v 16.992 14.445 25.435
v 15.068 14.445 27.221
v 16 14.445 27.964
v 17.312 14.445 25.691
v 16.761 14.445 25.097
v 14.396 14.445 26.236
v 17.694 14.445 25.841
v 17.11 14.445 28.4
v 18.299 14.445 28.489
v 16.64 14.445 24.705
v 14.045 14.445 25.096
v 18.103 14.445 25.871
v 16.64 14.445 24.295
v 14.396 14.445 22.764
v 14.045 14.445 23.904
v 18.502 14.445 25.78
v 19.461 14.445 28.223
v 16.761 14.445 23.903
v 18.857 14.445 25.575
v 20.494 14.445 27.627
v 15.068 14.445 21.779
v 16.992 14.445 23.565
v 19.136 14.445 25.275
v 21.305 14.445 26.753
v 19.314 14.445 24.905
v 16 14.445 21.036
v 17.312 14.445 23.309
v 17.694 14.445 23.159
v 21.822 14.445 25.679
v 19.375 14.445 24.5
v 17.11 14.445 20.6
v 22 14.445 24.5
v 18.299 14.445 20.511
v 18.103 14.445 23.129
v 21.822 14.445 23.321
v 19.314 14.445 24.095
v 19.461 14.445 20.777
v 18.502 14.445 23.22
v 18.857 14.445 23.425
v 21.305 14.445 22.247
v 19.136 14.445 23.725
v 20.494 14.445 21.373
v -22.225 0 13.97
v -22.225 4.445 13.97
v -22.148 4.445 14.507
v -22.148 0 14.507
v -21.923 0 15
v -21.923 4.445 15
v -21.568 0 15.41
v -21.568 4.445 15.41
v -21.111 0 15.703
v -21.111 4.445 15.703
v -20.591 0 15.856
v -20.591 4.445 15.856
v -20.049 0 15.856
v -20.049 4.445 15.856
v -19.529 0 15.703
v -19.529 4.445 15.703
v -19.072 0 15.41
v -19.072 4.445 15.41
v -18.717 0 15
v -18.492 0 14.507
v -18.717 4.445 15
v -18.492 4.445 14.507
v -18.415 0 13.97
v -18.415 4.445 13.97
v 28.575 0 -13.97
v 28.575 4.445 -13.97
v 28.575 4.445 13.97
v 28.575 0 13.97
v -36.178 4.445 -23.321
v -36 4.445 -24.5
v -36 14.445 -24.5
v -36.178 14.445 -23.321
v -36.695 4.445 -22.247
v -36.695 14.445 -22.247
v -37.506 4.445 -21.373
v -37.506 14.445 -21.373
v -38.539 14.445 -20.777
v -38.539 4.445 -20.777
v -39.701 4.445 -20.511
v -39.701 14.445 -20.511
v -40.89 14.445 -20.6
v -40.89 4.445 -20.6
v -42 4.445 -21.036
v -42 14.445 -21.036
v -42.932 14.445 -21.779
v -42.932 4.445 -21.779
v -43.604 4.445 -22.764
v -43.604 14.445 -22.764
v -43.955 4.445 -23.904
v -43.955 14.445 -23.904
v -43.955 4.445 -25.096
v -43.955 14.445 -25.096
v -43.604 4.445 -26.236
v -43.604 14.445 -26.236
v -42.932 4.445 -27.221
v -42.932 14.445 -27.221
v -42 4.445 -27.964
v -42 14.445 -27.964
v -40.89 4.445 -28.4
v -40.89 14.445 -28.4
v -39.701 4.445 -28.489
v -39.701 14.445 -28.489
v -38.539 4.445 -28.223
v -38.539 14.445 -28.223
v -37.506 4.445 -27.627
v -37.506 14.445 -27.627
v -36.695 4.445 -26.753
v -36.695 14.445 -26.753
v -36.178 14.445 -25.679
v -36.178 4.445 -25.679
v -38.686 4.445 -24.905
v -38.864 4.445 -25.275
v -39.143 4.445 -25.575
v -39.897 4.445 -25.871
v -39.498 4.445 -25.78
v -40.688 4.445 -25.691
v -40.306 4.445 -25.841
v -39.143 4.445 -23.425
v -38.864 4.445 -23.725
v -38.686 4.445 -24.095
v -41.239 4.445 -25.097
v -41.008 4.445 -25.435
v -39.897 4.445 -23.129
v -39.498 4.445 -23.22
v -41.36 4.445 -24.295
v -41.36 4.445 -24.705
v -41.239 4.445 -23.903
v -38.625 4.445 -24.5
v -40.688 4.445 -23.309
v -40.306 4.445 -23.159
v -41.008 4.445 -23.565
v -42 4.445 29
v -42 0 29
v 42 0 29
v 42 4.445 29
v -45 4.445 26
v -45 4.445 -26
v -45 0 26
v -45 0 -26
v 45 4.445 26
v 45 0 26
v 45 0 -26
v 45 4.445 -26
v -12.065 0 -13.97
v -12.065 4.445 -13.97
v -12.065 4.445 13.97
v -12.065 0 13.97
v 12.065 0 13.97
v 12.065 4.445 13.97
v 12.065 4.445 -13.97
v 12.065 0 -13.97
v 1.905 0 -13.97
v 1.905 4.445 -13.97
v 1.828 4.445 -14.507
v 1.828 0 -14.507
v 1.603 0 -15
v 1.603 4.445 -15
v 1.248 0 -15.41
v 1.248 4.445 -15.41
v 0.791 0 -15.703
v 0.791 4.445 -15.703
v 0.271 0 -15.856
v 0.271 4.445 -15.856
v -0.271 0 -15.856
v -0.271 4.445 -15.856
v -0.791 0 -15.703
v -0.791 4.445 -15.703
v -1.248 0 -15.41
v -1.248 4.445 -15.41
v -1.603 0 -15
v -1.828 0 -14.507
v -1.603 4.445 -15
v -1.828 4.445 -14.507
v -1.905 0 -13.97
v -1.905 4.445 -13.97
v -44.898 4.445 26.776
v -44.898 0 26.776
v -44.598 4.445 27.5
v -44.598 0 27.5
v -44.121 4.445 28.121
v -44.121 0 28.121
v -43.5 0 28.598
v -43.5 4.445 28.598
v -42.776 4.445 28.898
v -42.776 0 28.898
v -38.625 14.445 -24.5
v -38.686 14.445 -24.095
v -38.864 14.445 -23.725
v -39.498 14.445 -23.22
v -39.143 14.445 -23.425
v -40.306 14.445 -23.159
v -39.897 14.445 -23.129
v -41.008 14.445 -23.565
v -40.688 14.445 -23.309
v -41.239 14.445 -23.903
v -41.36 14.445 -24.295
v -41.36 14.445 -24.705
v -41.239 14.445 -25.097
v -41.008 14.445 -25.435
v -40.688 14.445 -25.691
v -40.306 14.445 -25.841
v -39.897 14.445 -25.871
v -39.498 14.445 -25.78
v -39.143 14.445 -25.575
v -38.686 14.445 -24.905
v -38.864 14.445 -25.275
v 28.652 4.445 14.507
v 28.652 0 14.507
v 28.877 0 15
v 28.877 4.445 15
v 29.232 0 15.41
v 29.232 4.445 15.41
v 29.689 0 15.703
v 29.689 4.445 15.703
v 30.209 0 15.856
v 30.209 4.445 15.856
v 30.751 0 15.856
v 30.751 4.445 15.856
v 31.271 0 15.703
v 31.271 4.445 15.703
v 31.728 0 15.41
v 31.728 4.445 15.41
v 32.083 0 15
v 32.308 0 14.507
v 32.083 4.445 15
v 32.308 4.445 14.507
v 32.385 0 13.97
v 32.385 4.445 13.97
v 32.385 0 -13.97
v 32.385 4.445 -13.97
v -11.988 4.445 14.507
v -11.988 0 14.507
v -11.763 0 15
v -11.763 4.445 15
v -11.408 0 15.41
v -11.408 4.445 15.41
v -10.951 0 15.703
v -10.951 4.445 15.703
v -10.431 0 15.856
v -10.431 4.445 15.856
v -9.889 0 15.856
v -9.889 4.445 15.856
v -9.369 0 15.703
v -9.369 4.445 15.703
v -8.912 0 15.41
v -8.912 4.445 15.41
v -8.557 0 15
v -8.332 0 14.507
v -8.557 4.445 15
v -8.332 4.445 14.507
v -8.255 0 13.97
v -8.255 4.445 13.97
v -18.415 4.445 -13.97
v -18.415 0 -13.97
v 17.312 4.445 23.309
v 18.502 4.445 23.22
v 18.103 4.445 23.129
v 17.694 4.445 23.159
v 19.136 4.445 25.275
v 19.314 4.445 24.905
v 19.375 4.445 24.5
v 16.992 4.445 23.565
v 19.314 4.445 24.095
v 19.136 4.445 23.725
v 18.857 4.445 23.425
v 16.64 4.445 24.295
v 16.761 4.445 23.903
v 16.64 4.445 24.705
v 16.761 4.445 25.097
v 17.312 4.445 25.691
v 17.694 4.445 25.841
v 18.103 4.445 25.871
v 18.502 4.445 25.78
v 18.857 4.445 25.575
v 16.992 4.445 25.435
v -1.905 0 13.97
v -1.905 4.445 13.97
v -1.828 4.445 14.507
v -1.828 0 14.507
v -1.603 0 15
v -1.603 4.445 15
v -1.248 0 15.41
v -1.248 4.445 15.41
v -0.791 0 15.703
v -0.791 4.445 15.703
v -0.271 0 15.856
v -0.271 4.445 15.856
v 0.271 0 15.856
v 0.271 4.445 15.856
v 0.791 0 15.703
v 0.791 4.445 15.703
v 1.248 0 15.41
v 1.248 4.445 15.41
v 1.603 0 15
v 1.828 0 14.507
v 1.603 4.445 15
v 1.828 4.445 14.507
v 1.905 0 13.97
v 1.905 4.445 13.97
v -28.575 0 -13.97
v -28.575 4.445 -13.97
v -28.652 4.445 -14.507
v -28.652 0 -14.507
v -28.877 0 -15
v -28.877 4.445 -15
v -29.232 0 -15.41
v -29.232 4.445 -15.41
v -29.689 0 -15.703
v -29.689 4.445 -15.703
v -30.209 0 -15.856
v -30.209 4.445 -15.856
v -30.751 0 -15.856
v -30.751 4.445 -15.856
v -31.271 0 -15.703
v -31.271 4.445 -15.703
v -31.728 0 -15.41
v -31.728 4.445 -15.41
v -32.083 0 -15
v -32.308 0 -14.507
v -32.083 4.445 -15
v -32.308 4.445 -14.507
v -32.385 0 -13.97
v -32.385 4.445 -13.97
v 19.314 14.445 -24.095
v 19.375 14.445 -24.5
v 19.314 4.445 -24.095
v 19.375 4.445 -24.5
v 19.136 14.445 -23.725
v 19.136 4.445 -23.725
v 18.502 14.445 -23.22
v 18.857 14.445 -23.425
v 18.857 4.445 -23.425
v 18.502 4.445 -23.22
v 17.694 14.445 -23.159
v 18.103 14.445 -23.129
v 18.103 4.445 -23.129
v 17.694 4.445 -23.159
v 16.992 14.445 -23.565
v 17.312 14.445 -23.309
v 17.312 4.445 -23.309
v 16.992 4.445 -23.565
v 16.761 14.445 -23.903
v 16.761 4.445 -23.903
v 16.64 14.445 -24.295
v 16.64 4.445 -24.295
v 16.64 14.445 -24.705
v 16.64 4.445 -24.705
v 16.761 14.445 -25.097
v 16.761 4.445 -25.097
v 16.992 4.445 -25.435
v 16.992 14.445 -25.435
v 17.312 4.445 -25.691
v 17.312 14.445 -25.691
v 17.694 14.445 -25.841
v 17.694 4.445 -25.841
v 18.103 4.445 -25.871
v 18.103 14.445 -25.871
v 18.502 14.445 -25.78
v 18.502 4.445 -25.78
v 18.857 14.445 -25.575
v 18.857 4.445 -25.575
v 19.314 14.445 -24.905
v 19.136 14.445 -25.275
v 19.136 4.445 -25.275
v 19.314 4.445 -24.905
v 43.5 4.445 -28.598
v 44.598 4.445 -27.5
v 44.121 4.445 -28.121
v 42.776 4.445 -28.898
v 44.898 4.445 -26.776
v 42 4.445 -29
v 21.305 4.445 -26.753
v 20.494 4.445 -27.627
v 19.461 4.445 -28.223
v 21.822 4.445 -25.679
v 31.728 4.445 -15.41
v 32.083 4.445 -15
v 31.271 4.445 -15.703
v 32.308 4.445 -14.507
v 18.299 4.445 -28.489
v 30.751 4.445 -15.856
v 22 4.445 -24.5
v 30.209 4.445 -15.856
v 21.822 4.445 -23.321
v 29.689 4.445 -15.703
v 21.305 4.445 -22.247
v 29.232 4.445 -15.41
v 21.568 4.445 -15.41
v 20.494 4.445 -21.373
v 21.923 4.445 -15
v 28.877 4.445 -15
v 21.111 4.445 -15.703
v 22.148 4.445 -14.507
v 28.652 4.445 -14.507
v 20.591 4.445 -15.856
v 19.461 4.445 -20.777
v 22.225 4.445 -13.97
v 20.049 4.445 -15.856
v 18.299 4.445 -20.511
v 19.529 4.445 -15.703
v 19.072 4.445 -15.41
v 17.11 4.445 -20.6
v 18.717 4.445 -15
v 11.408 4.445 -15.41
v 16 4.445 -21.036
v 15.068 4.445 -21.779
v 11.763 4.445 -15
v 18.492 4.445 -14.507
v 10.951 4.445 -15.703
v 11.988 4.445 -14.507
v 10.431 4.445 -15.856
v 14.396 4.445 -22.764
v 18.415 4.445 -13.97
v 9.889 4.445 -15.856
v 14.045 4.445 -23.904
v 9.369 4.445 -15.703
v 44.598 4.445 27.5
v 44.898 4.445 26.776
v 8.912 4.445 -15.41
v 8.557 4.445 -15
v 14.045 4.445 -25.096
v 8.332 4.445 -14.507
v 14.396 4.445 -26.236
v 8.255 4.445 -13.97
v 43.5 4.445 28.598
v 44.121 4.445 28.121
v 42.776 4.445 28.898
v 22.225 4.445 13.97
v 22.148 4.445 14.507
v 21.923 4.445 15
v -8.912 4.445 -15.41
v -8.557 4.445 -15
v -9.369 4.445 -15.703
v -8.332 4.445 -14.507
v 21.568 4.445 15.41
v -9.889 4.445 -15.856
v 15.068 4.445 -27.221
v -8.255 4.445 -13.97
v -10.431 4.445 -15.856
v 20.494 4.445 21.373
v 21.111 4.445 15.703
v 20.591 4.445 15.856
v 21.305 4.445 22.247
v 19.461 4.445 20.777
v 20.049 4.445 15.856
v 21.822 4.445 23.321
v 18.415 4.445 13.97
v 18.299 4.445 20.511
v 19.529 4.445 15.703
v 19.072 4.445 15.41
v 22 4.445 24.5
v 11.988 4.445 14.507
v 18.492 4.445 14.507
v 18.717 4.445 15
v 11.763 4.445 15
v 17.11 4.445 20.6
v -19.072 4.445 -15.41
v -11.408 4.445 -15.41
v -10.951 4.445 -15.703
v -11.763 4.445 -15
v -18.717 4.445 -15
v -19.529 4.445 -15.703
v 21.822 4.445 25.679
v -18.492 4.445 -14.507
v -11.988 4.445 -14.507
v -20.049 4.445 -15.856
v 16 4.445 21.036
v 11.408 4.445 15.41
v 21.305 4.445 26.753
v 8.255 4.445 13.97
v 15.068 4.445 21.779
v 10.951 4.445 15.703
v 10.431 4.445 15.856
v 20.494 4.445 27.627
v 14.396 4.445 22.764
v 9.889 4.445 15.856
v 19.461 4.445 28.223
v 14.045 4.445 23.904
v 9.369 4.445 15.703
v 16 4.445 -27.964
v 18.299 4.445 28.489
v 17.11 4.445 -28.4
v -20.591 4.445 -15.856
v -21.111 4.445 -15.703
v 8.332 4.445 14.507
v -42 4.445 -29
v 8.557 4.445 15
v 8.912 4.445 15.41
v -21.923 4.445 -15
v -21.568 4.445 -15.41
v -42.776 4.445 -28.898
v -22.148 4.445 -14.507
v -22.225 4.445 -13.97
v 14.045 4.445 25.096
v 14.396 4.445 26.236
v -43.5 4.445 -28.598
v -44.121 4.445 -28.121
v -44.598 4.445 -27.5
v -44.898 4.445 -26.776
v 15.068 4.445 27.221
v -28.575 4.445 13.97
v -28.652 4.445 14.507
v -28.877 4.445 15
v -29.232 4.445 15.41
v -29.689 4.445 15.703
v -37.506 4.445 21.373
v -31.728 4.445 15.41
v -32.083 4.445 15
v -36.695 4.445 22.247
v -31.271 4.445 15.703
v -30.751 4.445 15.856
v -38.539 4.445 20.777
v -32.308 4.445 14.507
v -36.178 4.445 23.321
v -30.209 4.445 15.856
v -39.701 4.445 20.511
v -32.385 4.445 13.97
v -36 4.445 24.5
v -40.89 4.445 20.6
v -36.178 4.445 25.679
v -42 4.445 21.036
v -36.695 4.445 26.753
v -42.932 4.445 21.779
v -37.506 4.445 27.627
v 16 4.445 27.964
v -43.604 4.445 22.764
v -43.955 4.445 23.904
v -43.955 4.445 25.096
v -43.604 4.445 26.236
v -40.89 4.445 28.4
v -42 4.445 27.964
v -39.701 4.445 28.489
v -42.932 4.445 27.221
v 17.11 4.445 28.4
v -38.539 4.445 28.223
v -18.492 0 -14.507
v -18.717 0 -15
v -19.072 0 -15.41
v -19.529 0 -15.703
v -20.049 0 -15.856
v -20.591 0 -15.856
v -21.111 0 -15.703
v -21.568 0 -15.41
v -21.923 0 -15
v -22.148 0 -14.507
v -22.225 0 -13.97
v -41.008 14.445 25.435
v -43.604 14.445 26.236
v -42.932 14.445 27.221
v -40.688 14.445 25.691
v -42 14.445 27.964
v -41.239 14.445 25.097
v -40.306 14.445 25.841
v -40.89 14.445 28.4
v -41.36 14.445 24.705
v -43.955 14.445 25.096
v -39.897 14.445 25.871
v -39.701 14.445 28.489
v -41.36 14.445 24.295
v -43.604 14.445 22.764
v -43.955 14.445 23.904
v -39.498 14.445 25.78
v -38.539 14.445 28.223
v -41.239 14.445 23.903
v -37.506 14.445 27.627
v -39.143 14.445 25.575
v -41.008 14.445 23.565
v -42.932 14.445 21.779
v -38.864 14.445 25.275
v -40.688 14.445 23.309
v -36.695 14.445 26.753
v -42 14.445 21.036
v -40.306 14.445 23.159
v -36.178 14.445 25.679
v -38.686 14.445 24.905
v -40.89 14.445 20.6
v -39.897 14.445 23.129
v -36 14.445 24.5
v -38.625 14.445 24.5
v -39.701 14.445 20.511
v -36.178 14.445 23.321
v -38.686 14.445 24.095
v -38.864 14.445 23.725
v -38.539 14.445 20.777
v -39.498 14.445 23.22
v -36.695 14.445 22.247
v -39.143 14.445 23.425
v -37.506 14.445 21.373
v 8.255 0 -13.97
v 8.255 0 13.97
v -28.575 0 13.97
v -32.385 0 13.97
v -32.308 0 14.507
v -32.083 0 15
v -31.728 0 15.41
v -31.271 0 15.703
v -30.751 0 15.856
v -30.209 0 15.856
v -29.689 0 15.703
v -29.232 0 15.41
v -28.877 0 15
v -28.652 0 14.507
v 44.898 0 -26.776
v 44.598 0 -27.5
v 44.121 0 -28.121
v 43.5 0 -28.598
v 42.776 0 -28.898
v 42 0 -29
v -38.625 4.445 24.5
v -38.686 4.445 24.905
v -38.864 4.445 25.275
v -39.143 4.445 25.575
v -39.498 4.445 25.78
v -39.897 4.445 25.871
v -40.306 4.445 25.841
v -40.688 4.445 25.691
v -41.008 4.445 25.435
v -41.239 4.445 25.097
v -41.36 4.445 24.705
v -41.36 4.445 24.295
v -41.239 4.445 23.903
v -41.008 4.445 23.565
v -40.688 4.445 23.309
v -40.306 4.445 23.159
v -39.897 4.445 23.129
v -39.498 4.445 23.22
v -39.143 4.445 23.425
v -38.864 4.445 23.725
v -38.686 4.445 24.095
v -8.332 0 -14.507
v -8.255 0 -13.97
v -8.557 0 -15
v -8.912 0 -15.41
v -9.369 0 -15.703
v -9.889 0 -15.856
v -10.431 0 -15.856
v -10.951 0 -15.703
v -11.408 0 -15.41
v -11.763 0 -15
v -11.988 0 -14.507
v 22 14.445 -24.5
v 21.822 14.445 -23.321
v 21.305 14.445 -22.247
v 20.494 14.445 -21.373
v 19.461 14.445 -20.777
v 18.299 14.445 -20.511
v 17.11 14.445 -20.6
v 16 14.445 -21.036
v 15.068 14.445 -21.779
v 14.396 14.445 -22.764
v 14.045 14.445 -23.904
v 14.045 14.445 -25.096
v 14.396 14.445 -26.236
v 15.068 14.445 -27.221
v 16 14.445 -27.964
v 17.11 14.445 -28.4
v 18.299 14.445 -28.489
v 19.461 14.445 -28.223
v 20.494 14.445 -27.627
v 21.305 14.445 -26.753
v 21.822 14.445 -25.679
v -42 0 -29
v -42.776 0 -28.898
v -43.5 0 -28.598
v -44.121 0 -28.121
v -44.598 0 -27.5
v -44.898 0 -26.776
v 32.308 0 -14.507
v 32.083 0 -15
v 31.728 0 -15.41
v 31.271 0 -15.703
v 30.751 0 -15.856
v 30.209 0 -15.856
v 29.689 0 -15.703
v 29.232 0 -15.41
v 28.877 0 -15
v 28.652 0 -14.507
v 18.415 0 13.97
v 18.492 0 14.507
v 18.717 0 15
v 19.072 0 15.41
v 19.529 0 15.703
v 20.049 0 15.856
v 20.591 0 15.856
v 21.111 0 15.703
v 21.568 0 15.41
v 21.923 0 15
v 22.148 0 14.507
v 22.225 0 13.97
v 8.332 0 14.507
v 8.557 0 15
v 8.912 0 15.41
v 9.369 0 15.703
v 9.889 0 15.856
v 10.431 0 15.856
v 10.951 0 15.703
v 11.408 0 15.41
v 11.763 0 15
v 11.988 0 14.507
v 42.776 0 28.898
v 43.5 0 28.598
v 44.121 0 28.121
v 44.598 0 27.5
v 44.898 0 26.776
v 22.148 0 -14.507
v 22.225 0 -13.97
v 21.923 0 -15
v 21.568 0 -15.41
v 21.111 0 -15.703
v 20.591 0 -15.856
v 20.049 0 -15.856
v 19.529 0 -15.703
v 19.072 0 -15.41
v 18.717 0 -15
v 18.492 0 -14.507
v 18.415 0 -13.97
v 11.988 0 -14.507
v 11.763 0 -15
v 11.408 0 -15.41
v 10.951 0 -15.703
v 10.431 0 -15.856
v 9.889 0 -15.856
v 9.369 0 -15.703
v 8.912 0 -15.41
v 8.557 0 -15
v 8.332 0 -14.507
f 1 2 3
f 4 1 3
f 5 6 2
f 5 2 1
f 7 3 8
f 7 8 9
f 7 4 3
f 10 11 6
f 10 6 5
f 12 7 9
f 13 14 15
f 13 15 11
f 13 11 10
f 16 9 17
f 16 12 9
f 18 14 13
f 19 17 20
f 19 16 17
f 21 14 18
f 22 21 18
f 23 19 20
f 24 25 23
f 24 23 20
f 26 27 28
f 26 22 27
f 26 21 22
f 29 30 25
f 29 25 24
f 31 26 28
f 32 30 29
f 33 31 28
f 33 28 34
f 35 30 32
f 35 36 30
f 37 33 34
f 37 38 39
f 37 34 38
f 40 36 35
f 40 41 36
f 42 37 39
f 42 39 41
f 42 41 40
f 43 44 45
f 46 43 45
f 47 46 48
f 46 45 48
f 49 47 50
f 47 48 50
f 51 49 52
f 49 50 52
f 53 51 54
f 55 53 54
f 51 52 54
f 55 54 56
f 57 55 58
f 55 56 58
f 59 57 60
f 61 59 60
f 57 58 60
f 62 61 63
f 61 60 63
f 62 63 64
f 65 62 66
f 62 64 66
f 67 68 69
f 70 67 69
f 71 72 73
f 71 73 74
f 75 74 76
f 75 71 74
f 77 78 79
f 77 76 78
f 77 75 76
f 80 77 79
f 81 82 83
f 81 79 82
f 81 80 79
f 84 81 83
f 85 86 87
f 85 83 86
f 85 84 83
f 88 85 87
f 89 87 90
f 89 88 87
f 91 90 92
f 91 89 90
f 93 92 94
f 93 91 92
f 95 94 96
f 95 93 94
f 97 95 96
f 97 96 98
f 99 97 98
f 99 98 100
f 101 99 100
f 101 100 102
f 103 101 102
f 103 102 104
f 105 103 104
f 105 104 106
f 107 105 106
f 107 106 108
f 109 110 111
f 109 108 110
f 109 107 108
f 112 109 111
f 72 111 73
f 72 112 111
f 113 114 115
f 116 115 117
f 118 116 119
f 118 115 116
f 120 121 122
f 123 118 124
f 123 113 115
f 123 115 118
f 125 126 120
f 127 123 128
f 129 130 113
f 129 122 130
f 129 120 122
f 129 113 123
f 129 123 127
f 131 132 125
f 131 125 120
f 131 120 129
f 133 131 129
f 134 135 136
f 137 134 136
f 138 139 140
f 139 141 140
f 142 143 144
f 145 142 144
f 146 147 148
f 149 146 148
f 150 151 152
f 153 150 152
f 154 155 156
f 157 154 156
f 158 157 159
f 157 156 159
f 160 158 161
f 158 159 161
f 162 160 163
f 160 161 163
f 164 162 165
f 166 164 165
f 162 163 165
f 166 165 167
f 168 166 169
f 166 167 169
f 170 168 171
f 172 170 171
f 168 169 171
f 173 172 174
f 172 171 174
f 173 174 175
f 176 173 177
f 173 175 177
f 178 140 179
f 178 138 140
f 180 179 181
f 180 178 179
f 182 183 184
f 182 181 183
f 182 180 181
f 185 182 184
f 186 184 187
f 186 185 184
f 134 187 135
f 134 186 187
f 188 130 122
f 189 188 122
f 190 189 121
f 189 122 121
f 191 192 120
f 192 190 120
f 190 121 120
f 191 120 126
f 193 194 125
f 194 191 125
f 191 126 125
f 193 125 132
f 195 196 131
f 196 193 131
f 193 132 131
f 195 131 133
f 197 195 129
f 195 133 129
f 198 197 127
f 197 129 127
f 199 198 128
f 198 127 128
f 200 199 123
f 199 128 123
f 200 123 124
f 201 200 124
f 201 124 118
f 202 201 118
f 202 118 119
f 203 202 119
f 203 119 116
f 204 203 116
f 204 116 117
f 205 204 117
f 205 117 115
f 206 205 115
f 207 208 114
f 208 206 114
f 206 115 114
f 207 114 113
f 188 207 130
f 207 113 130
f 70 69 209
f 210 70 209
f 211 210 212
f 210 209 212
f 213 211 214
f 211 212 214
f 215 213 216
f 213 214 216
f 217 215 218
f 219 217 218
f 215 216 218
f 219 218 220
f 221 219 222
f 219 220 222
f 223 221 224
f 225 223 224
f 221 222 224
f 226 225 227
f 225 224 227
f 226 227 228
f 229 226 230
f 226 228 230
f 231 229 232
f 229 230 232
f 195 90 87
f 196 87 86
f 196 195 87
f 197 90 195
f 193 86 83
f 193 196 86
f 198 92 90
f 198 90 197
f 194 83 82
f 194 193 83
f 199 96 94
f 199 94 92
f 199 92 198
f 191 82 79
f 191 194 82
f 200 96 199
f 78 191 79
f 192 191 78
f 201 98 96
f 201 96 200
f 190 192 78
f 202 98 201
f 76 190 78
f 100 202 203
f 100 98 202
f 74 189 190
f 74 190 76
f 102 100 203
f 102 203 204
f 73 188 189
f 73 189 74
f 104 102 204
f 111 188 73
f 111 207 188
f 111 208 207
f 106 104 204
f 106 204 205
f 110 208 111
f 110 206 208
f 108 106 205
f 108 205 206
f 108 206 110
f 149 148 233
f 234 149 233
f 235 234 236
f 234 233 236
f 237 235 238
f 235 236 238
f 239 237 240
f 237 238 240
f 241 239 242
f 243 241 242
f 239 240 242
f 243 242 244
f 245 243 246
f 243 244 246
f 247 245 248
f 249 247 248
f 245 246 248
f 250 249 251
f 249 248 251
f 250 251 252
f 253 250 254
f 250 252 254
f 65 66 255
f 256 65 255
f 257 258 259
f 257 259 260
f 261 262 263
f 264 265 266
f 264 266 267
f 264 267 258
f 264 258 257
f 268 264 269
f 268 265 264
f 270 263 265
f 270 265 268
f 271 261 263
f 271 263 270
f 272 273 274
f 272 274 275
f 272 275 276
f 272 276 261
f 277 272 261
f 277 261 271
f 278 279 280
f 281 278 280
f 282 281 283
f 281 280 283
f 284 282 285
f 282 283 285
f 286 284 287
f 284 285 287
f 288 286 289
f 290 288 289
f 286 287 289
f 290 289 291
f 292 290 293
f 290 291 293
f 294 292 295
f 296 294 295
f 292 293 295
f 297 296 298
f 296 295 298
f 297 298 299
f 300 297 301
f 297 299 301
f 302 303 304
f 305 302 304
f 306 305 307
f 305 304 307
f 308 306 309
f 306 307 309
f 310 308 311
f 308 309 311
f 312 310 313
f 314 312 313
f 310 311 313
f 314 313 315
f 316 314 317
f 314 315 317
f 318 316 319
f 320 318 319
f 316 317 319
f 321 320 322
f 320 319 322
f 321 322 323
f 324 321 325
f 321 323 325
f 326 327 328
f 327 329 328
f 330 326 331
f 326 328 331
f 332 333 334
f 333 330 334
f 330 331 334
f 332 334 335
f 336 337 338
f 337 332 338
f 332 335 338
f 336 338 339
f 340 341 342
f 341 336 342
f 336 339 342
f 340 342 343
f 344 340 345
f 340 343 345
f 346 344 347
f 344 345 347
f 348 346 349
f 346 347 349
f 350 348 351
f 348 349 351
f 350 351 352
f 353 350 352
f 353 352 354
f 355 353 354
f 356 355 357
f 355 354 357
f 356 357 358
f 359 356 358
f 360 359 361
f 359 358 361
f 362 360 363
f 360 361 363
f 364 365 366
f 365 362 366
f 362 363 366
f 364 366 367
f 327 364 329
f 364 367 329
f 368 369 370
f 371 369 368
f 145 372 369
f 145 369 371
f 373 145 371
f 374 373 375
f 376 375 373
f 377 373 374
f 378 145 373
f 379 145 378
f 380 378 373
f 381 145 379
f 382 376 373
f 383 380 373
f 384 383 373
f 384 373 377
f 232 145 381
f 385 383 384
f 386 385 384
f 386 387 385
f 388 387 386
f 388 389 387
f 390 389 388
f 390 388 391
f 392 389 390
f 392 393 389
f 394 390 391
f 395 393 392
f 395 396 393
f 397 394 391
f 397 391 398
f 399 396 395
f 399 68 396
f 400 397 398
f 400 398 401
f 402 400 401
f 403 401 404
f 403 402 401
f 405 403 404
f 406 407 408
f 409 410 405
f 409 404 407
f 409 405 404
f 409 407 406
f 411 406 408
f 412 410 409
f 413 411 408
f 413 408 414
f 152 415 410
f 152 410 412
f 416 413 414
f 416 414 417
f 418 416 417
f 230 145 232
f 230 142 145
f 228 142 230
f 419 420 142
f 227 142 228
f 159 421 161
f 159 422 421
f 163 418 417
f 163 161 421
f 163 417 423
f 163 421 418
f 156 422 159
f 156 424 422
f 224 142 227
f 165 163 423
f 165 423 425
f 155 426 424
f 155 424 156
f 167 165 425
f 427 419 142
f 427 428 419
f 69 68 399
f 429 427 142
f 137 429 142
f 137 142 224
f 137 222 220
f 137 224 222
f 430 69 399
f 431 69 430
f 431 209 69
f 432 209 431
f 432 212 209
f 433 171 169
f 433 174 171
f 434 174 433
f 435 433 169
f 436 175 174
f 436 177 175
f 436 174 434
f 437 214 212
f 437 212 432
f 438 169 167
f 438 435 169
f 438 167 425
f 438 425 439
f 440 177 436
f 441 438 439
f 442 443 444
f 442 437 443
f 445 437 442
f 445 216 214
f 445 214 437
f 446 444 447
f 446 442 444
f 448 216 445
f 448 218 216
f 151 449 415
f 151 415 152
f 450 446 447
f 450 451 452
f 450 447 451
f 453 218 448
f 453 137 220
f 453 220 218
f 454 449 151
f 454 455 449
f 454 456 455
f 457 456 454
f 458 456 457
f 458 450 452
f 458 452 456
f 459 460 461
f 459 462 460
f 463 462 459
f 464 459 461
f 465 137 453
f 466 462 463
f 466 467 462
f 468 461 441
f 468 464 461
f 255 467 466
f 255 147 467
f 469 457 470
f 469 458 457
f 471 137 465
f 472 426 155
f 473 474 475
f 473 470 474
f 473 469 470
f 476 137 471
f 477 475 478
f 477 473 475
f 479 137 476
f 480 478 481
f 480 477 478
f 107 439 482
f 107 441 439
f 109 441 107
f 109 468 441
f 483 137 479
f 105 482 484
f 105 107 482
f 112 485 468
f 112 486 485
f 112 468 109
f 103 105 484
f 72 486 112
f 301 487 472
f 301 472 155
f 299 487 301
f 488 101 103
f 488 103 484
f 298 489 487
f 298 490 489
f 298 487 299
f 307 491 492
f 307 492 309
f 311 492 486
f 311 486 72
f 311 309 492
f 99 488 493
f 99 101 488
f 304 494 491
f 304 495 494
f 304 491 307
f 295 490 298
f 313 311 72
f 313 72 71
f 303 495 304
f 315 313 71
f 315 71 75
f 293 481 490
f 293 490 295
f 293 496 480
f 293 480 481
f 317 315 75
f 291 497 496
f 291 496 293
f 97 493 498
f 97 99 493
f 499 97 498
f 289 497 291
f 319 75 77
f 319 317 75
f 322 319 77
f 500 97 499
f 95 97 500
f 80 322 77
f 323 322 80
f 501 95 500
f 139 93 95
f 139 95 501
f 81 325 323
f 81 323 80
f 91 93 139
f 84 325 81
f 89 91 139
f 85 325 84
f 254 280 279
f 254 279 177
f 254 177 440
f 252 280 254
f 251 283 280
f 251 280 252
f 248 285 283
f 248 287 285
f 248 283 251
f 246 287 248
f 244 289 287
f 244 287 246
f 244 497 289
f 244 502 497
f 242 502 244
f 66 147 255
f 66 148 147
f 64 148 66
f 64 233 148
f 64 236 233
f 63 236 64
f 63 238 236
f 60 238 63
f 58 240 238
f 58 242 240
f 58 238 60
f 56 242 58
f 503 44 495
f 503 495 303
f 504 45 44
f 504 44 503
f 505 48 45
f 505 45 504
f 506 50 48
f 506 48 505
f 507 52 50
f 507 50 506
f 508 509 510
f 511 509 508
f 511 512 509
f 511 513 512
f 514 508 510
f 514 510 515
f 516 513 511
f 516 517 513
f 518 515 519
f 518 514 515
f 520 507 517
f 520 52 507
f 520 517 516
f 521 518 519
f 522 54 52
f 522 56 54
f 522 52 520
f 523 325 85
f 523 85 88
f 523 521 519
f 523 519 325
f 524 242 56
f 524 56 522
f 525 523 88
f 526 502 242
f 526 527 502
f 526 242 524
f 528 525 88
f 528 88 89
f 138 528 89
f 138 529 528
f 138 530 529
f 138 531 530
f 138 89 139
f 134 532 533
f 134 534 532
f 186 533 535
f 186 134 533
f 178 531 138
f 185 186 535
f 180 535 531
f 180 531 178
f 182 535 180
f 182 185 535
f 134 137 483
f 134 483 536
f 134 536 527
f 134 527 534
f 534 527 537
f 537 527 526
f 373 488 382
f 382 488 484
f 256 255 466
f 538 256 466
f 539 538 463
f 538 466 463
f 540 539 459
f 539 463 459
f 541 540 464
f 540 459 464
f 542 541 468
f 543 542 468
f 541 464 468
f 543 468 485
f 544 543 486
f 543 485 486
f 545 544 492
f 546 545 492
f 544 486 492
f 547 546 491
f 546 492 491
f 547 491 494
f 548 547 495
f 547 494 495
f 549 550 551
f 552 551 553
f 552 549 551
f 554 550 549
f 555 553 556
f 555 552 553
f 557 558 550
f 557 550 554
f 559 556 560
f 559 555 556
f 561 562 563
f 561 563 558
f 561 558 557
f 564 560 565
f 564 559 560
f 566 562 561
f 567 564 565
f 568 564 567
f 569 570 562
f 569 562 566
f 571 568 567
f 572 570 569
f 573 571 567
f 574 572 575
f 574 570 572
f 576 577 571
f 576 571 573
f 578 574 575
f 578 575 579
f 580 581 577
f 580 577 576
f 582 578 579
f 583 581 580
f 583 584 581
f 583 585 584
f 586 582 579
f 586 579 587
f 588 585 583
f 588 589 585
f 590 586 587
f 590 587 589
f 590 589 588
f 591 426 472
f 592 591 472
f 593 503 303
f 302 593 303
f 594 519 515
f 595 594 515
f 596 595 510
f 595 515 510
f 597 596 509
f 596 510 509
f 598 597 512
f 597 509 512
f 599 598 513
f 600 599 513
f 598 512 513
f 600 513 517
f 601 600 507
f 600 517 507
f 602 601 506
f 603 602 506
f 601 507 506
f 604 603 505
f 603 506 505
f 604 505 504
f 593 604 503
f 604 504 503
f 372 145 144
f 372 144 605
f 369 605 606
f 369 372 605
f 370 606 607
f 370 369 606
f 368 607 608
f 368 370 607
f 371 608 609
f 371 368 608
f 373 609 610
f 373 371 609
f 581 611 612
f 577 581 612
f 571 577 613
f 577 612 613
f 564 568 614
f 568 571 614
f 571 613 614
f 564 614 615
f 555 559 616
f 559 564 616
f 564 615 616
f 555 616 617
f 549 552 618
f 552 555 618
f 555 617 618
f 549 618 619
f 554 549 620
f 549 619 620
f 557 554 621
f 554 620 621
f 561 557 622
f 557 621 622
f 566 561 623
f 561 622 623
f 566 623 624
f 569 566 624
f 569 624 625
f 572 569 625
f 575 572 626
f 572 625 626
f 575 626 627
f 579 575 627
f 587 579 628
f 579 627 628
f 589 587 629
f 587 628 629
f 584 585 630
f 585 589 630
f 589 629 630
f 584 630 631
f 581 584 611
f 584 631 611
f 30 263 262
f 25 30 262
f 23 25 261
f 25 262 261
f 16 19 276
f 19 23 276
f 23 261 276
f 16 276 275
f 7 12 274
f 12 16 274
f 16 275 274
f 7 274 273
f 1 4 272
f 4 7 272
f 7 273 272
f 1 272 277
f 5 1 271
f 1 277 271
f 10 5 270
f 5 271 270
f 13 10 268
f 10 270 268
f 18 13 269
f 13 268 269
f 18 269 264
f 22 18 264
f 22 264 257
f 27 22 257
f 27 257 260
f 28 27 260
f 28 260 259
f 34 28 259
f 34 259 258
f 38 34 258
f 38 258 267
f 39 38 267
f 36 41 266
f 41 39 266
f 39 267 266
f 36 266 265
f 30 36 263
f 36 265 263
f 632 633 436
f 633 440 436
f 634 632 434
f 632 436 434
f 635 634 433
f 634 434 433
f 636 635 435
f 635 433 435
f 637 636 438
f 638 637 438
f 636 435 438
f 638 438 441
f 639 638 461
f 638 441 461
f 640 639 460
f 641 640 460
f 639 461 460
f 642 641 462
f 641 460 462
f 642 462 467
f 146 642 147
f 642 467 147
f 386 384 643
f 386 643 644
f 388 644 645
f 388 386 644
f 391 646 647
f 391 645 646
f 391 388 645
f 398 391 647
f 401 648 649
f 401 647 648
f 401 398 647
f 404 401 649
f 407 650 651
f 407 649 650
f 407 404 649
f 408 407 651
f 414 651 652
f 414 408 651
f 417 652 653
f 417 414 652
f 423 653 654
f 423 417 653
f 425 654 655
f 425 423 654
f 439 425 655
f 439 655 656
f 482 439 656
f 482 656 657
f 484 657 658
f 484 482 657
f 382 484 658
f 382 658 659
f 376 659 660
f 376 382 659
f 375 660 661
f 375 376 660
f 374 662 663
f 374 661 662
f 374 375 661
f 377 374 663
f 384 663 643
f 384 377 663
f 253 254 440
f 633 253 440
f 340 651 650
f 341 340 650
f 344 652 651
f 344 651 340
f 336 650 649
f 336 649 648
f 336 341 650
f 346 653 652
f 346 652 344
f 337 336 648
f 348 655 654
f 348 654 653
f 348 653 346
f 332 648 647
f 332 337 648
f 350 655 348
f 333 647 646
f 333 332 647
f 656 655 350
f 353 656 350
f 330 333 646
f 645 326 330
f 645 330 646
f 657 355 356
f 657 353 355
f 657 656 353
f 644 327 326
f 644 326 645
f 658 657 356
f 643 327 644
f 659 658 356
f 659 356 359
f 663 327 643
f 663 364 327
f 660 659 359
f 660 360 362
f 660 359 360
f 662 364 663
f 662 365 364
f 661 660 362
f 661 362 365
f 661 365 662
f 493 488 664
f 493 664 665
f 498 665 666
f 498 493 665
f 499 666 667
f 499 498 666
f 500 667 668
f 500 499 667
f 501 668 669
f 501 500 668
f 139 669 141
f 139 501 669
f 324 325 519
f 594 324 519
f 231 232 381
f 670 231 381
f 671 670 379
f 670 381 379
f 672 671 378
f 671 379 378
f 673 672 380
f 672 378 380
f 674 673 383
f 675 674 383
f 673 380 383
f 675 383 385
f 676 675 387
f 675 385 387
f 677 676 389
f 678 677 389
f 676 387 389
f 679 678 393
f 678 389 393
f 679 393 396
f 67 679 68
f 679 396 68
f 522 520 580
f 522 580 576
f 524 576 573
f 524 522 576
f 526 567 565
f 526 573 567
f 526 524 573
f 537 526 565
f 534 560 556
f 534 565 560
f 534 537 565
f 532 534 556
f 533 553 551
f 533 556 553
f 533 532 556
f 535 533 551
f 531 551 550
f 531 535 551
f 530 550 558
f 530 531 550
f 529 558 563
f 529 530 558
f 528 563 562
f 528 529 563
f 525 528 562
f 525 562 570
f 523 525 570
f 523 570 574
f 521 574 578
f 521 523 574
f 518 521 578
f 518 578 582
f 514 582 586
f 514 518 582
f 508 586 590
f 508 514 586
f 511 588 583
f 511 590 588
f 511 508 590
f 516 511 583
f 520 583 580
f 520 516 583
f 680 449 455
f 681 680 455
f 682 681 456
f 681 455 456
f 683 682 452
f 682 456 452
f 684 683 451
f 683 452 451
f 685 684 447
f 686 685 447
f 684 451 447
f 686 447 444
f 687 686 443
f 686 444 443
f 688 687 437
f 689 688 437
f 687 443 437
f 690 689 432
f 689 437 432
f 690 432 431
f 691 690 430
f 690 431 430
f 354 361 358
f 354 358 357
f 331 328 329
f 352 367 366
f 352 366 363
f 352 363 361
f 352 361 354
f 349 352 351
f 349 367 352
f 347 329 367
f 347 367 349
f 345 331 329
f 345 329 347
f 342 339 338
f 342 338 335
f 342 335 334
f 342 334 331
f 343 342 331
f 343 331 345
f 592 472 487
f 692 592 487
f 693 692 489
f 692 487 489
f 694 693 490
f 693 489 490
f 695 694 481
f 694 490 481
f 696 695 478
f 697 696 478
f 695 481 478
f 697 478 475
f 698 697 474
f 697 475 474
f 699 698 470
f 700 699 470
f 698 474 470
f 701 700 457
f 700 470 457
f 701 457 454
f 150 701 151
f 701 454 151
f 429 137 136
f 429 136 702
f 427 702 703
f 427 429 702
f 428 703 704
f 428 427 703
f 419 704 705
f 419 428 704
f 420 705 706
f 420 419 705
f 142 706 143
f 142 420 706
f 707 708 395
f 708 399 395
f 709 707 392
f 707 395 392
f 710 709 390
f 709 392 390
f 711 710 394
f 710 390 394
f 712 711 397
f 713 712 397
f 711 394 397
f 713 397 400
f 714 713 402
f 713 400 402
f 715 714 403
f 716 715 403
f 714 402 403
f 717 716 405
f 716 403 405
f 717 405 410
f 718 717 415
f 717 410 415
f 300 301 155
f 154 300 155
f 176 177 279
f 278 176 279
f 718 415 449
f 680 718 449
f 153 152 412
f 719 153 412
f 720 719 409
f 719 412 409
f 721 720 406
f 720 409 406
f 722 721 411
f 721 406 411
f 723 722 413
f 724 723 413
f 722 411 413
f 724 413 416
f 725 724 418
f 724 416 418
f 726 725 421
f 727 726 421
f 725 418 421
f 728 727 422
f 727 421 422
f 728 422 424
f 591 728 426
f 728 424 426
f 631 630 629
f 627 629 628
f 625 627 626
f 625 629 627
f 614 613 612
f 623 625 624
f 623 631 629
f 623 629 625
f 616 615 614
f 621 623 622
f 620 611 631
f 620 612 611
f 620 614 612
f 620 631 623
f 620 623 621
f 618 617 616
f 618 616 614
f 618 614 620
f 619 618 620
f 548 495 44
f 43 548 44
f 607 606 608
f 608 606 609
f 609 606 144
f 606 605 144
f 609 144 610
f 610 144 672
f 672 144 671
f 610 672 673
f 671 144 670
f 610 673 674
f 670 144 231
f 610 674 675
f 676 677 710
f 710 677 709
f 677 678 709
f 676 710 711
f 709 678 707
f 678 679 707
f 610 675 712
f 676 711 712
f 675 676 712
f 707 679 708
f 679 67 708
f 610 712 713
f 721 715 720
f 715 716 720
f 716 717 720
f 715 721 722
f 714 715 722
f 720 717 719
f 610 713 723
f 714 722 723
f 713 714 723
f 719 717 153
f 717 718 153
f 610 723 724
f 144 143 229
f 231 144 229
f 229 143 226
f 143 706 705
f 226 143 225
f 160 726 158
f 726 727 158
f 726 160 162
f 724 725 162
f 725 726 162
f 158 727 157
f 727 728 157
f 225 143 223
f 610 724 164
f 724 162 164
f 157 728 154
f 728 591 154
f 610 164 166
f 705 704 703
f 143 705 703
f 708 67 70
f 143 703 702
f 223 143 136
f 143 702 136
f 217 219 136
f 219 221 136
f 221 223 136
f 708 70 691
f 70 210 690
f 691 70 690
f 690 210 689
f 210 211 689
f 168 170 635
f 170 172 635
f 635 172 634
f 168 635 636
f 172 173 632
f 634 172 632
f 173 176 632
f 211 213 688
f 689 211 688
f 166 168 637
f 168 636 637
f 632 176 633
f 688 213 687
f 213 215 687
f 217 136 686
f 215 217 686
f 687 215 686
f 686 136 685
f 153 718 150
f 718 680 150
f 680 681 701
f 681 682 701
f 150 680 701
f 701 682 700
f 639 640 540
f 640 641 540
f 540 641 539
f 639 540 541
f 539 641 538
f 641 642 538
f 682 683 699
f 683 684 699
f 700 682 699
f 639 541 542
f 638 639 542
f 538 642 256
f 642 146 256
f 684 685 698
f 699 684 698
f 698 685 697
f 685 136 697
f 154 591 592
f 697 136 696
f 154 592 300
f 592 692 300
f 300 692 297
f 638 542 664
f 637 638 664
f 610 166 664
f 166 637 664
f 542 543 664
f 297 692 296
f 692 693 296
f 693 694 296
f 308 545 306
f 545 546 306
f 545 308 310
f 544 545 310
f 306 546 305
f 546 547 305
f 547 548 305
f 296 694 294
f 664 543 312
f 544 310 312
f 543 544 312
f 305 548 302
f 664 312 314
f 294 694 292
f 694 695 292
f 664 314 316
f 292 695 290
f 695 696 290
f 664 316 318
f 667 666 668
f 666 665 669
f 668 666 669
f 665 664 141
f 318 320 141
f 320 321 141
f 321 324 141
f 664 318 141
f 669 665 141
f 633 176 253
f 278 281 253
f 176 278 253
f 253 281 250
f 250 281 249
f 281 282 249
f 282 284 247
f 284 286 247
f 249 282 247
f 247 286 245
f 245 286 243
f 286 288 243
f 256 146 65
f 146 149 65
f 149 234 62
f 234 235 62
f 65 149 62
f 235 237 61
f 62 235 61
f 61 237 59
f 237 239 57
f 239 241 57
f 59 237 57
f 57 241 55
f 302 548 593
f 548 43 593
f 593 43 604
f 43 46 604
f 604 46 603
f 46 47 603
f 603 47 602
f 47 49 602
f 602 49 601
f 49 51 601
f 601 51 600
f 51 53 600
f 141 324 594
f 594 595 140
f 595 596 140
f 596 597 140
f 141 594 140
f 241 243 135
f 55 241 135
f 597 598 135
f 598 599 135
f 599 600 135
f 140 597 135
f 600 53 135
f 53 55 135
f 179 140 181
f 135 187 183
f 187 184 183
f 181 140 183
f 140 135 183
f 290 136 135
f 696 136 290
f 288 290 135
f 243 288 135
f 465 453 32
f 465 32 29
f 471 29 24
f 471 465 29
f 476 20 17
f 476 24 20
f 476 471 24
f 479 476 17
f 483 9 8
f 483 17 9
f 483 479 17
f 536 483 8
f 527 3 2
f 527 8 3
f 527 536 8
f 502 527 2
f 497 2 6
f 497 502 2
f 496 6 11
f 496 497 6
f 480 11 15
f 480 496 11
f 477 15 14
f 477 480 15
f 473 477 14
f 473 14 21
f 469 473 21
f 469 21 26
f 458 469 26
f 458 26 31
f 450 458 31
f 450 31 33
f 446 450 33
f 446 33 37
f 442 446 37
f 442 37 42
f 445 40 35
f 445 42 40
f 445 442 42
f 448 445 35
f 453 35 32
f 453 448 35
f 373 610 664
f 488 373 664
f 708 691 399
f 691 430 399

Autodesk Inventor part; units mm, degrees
ref_plane "YZ Plane" through (0, 0, 0) normal (1, 0, 0) x (0, 1, 0)
ref_plane "XZ Plane" through (0, 0, 0) normal (0, 1, 0) x (-1, 0, 0)
ref_plane "XY Plane" through (0, 0, 0) normal (0, 0, 1) x (1, 0, 0)
sketch "Sketch1" plane through (0, 0, 0) normal (0, 1, 0) x (-1, 0, 0)
  line L0 (-45, -29) -> (45, -29)
  line L1 (45, -29) -> (45, 29)
  line L2 (45, 29) -> (-45, 29)
  line L3 (-45, 29) -> (-45, -29)
  line L4 (-45, -29) -> (45, 29) construction
  line L5 (45, -29) -> (-45, 29) construction
  point P0 (0, 0)
  dimension "d0" = 90
  dimension "d1" = 58
extrude "Extrusion1" add sketch "Sketch1" along normal blind 4.445
fillet "Fillet2" radius 3 4 edges at (45, 2.2225, 29) (-45, 2.2225, 29) (45, 2.2225, -29) (-45, 2.2225, -29)
sketch "Sketch4" plane through (0, 4.445, 0) normal (0, 1, 0) x (1, 0, 0)
  line L0 (0, -13.97) -> (0, 13.97) construction
  line L1 (1.905, -13.97) -> (1.905, 13.97)
  line L2 (-1.905, 13.97) -> (-1.905, -13.97)
  arc A0 (-1.905, -13.97) -> (1.905, -13.97) centre (0, -13.97) ccw
  arc A1 (1.905, 13.97) -> (-1.905, 13.97) centre (0, 13.97) ccw
  line L3 (42, 29) -> (-42, 29) construction
  line L4 (0, 29) -> (0, -29) construction
  line L5 (-42, -29) -> (42, -29) construction
  line L6 (45, -26) -> (45, 26) construction
  line L7 (45, 0) -> (-45, 0) construction
  line L8 (-45, 26) -> (-45, -26) construction
  line L9 (-8.255, -13.97) -> (-8.255, 13.97)
  line L10 (-12.065, 13.97) -> (-12.065, -13.97)
  arc A2 (-8.255, 13.97) -> (-12.065, 13.97) centre (-10.16, 13.97) ccw
  arc A3 (-12.065, -13.97) -> (-8.255, -13.97) centre (-10.16, -13.97) ccw
  line L11 (-18.415, -13.97) -> (-18.415, 13.97)
  line L12 (-22.225, 13.97) -> (-22.225, -13.97)
  arc A4 (-18.415, 13.97) -> (-22.225, 13.97) centre (-20.32, 13.97) ccw
  arc A5 (-22.225, -13.97) -> (-18.415, -13.97) centre (-20.32, -13.97) ccw
  line L13 (-28.575, -13.97) -> (-28.575, 13.97)
  line L14 (-32.385, 13.97) -> (-32.385, -13.97)
  arc A6 (-28.575, 13.97) -> (-32.385, 13.97) centre (-30.48, 13.97) ccw
  arc A7 (-32.385, -13.97) -> (-28.575, -13.97) centre (-30.48, -13.97) ccw
  line L15 (12.065, -13.97) -> (12.065, 13.97)
  line L16 (8.255, 13.97) -> (8.255, -13.97)
  arc A8 (12.065, 13.97) -> (8.255, 13.97) centre (10.16, 13.97) ccw
  arc A9 (8.255, -13.97) -> (12.065, -13.97) centre (10.16, -13.97) ccw
  line L17 (1.905, -13.97) -> (1.905, 13.97)
  line L18 (-1.905, 13.97) -> (-1.905, -13.97)
  arc A10 (1.905, 13.97) -> (-1.905, 13.97) centre (0, 13.97) ccw
  arc A11 (-1.905, -13.97) -> (1.905, -13.97) centre (0, -13.97) ccw
  line L19 (-8.255, -13.97) -> (-8.255, 13.97)
  line L20 (-12.065, 13.97) -> (-12.065, -13.97)
  arc A12 (-8.255, 13.97) -> (-12.065, 13.97) centre (-10.16, 13.97) ccw
  arc A13 (-12.065, -13.97) -> (-8.255, -13.97) centre (-10.16, -13.97) ccw
  line L21 (-18.415, -13.97) -> (-18.415, 13.97)
  line L22 (-22.225, 13.97) -> (-22.225, -13.97)
  arc A14 (-18.415, 13.97) -> (-22.225, 13.97) centre (-20.32, 13.97) ccw
  arc A15 (-22.225, -13.97) -> (-18.415, -13.97) centre (-20.32, -13.97) ccw
  line L23 (22.225, -13.97) -> (22.225, 13.97)
  line L24 (18.415, 13.97) -> (18.415, -13.97)
  arc A16 (22.225, 13.97) -> (18.415, 13.97) centre (20.32, 13.97) ccw
  arc A17 (18.415, -13.97) -> (22.225, -13.97) centre (20.32, -13.97) ccw
  line L25 (12.065, -13.97) -> (12.065, 13.97)
  line L26 (8.255, 13.97) -> (8.255, -13.97)
  arc A18 (12.065, 13.97) -> (8.255, 13.97) centre (10.16, 13.97) ccw
  arc A19 (8.255, -13.97) -> (12.065, -13.97) centre (10.16, -13.97) ccw
  line L27 (1.905, -13.97) -> (1.905, 13.97)
  line L28 (-1.905, 13.97) -> (-1.905, -13.97)
  arc A20 (1.905, 13.97) -> (-1.905, 13.97) centre (0, 13.97) ccw
  arc A21 (-1.905, -13.97) -> (1.905, -13.97) centre (0, -13.97) ccw
  line L29 (-8.255, -13.97) -> (-8.255, 13.97)
  line L30 (-12.065, 13.97) -> (-12.065, -13.97)
  arc A22 (-8.255, 13.97) -> (-12.065, 13.97) centre (-10.16, 13.97) ccw
  arc A23 (-12.065, -13.97) -> (-8.255, -13.97) centre (-10.16, -13.97) ccw
  line L31 (32.385, -13.97) -> (32.385, 13.97)
  line L32 (28.575, 13.97) -> (28.575, -13.97)
  arc A24 (32.385, 13.97) -> (28.575, 13.97) centre (30.48, 13.97) ccw
  arc A25 (28.575, -13.97) -> (32.385, -13.97) centre (30.48, -13.97) ccw
  line L33 (22.225, -13.97) -> (22.225, 13.97)
  line L34 (18.415, 13.97) -> (18.415, -13.97)
  arc A26 (22.225, 13.97) -> (18.415, 13.97) centre (20.32, 13.97) ccw
  arc A27 (18.415, -13.97) -> (22.225, -13.97) centre (20.32, -13.97) ccw
  line L35 (12.065, -13.97) -> (12.065, 13.97)
  line L36 (8.255, 13.97) -> (8.255, -13.97)
  arc A28 (12.065, 13.97) -> (8.255, 13.97) centre (10.16, 13.97) ccw
  arc A29 (8.255, -13.97) -> (12.065, -13.97) centre (10.16, -13.97) ccw
  line L37 (1.905, -13.97) -> (1.905, 13.97)
  line L38 (-1.905, 13.97) -> (-1.905, -13.97)
  arc A30 (1.905, 13.97) -> (-1.905, 13.97) centre (0, 13.97) ccw
  arc A31 (-1.905, -13.97) -> (1.905, -13.97) centre (0, -13.97) ccw
  point P0 (0, 0)
  dimension "d18" = 13.97
  dimension "d19" = 3.81
  dimension "d22" = 10.16
  dimension "d25" = 10.16
extrude "Extrusion3" cut sketch "Sketch4" against normal blind 4.445
sketch "Sketch5" plane through (0, 4.445, 0) normal (0, 1, 0) x (1, 0, 0)
  circle A0 centre (-40, 24.5) radius 4
  circle A1 centre (-40, 24.5) radius 1.375
  line L0 (-45, 26) -> (-45, -26) projected
  line L1 (42, 29) -> (-42, 29) projected
  line L2 (-45, 0) -> (45, 0)
  line L3 (45, -26) -> (45, 26) projected
  circle A2 centre (-40, -24.5) radius 4
  circle A3 centre (-40, -24.5) radius 1.375
  circle A4 centre (18, 24.5) radius 4
  circle A5 centre (18, 24.5) radius 1.375
  circle A6 centre (18, -24.5) radius 4
  circle A7 centre (18, -24.5) radius 1.375
  line L4 (-42, -29) -> (42, -29) projected
  point P0 (0, 0)
  dimension "d35" = 8
  dimension "d36" = 2.75
  dimension "d37" = 5
  dimension "d39" = 8
  dimension "d40" = 2.75
  dimension "d41" = 58
  dimension "d43" = 4.5
  dimension "d45" = 8
  dimension "d46" = 2.75
  dimension "d47" = 49
  dimension "d50" = 58
  dimension "d51" = 4.5
extrude "Extrusion4" add sketch "Sketch5" along normal blind 10
properties part number "_3DPrint"
